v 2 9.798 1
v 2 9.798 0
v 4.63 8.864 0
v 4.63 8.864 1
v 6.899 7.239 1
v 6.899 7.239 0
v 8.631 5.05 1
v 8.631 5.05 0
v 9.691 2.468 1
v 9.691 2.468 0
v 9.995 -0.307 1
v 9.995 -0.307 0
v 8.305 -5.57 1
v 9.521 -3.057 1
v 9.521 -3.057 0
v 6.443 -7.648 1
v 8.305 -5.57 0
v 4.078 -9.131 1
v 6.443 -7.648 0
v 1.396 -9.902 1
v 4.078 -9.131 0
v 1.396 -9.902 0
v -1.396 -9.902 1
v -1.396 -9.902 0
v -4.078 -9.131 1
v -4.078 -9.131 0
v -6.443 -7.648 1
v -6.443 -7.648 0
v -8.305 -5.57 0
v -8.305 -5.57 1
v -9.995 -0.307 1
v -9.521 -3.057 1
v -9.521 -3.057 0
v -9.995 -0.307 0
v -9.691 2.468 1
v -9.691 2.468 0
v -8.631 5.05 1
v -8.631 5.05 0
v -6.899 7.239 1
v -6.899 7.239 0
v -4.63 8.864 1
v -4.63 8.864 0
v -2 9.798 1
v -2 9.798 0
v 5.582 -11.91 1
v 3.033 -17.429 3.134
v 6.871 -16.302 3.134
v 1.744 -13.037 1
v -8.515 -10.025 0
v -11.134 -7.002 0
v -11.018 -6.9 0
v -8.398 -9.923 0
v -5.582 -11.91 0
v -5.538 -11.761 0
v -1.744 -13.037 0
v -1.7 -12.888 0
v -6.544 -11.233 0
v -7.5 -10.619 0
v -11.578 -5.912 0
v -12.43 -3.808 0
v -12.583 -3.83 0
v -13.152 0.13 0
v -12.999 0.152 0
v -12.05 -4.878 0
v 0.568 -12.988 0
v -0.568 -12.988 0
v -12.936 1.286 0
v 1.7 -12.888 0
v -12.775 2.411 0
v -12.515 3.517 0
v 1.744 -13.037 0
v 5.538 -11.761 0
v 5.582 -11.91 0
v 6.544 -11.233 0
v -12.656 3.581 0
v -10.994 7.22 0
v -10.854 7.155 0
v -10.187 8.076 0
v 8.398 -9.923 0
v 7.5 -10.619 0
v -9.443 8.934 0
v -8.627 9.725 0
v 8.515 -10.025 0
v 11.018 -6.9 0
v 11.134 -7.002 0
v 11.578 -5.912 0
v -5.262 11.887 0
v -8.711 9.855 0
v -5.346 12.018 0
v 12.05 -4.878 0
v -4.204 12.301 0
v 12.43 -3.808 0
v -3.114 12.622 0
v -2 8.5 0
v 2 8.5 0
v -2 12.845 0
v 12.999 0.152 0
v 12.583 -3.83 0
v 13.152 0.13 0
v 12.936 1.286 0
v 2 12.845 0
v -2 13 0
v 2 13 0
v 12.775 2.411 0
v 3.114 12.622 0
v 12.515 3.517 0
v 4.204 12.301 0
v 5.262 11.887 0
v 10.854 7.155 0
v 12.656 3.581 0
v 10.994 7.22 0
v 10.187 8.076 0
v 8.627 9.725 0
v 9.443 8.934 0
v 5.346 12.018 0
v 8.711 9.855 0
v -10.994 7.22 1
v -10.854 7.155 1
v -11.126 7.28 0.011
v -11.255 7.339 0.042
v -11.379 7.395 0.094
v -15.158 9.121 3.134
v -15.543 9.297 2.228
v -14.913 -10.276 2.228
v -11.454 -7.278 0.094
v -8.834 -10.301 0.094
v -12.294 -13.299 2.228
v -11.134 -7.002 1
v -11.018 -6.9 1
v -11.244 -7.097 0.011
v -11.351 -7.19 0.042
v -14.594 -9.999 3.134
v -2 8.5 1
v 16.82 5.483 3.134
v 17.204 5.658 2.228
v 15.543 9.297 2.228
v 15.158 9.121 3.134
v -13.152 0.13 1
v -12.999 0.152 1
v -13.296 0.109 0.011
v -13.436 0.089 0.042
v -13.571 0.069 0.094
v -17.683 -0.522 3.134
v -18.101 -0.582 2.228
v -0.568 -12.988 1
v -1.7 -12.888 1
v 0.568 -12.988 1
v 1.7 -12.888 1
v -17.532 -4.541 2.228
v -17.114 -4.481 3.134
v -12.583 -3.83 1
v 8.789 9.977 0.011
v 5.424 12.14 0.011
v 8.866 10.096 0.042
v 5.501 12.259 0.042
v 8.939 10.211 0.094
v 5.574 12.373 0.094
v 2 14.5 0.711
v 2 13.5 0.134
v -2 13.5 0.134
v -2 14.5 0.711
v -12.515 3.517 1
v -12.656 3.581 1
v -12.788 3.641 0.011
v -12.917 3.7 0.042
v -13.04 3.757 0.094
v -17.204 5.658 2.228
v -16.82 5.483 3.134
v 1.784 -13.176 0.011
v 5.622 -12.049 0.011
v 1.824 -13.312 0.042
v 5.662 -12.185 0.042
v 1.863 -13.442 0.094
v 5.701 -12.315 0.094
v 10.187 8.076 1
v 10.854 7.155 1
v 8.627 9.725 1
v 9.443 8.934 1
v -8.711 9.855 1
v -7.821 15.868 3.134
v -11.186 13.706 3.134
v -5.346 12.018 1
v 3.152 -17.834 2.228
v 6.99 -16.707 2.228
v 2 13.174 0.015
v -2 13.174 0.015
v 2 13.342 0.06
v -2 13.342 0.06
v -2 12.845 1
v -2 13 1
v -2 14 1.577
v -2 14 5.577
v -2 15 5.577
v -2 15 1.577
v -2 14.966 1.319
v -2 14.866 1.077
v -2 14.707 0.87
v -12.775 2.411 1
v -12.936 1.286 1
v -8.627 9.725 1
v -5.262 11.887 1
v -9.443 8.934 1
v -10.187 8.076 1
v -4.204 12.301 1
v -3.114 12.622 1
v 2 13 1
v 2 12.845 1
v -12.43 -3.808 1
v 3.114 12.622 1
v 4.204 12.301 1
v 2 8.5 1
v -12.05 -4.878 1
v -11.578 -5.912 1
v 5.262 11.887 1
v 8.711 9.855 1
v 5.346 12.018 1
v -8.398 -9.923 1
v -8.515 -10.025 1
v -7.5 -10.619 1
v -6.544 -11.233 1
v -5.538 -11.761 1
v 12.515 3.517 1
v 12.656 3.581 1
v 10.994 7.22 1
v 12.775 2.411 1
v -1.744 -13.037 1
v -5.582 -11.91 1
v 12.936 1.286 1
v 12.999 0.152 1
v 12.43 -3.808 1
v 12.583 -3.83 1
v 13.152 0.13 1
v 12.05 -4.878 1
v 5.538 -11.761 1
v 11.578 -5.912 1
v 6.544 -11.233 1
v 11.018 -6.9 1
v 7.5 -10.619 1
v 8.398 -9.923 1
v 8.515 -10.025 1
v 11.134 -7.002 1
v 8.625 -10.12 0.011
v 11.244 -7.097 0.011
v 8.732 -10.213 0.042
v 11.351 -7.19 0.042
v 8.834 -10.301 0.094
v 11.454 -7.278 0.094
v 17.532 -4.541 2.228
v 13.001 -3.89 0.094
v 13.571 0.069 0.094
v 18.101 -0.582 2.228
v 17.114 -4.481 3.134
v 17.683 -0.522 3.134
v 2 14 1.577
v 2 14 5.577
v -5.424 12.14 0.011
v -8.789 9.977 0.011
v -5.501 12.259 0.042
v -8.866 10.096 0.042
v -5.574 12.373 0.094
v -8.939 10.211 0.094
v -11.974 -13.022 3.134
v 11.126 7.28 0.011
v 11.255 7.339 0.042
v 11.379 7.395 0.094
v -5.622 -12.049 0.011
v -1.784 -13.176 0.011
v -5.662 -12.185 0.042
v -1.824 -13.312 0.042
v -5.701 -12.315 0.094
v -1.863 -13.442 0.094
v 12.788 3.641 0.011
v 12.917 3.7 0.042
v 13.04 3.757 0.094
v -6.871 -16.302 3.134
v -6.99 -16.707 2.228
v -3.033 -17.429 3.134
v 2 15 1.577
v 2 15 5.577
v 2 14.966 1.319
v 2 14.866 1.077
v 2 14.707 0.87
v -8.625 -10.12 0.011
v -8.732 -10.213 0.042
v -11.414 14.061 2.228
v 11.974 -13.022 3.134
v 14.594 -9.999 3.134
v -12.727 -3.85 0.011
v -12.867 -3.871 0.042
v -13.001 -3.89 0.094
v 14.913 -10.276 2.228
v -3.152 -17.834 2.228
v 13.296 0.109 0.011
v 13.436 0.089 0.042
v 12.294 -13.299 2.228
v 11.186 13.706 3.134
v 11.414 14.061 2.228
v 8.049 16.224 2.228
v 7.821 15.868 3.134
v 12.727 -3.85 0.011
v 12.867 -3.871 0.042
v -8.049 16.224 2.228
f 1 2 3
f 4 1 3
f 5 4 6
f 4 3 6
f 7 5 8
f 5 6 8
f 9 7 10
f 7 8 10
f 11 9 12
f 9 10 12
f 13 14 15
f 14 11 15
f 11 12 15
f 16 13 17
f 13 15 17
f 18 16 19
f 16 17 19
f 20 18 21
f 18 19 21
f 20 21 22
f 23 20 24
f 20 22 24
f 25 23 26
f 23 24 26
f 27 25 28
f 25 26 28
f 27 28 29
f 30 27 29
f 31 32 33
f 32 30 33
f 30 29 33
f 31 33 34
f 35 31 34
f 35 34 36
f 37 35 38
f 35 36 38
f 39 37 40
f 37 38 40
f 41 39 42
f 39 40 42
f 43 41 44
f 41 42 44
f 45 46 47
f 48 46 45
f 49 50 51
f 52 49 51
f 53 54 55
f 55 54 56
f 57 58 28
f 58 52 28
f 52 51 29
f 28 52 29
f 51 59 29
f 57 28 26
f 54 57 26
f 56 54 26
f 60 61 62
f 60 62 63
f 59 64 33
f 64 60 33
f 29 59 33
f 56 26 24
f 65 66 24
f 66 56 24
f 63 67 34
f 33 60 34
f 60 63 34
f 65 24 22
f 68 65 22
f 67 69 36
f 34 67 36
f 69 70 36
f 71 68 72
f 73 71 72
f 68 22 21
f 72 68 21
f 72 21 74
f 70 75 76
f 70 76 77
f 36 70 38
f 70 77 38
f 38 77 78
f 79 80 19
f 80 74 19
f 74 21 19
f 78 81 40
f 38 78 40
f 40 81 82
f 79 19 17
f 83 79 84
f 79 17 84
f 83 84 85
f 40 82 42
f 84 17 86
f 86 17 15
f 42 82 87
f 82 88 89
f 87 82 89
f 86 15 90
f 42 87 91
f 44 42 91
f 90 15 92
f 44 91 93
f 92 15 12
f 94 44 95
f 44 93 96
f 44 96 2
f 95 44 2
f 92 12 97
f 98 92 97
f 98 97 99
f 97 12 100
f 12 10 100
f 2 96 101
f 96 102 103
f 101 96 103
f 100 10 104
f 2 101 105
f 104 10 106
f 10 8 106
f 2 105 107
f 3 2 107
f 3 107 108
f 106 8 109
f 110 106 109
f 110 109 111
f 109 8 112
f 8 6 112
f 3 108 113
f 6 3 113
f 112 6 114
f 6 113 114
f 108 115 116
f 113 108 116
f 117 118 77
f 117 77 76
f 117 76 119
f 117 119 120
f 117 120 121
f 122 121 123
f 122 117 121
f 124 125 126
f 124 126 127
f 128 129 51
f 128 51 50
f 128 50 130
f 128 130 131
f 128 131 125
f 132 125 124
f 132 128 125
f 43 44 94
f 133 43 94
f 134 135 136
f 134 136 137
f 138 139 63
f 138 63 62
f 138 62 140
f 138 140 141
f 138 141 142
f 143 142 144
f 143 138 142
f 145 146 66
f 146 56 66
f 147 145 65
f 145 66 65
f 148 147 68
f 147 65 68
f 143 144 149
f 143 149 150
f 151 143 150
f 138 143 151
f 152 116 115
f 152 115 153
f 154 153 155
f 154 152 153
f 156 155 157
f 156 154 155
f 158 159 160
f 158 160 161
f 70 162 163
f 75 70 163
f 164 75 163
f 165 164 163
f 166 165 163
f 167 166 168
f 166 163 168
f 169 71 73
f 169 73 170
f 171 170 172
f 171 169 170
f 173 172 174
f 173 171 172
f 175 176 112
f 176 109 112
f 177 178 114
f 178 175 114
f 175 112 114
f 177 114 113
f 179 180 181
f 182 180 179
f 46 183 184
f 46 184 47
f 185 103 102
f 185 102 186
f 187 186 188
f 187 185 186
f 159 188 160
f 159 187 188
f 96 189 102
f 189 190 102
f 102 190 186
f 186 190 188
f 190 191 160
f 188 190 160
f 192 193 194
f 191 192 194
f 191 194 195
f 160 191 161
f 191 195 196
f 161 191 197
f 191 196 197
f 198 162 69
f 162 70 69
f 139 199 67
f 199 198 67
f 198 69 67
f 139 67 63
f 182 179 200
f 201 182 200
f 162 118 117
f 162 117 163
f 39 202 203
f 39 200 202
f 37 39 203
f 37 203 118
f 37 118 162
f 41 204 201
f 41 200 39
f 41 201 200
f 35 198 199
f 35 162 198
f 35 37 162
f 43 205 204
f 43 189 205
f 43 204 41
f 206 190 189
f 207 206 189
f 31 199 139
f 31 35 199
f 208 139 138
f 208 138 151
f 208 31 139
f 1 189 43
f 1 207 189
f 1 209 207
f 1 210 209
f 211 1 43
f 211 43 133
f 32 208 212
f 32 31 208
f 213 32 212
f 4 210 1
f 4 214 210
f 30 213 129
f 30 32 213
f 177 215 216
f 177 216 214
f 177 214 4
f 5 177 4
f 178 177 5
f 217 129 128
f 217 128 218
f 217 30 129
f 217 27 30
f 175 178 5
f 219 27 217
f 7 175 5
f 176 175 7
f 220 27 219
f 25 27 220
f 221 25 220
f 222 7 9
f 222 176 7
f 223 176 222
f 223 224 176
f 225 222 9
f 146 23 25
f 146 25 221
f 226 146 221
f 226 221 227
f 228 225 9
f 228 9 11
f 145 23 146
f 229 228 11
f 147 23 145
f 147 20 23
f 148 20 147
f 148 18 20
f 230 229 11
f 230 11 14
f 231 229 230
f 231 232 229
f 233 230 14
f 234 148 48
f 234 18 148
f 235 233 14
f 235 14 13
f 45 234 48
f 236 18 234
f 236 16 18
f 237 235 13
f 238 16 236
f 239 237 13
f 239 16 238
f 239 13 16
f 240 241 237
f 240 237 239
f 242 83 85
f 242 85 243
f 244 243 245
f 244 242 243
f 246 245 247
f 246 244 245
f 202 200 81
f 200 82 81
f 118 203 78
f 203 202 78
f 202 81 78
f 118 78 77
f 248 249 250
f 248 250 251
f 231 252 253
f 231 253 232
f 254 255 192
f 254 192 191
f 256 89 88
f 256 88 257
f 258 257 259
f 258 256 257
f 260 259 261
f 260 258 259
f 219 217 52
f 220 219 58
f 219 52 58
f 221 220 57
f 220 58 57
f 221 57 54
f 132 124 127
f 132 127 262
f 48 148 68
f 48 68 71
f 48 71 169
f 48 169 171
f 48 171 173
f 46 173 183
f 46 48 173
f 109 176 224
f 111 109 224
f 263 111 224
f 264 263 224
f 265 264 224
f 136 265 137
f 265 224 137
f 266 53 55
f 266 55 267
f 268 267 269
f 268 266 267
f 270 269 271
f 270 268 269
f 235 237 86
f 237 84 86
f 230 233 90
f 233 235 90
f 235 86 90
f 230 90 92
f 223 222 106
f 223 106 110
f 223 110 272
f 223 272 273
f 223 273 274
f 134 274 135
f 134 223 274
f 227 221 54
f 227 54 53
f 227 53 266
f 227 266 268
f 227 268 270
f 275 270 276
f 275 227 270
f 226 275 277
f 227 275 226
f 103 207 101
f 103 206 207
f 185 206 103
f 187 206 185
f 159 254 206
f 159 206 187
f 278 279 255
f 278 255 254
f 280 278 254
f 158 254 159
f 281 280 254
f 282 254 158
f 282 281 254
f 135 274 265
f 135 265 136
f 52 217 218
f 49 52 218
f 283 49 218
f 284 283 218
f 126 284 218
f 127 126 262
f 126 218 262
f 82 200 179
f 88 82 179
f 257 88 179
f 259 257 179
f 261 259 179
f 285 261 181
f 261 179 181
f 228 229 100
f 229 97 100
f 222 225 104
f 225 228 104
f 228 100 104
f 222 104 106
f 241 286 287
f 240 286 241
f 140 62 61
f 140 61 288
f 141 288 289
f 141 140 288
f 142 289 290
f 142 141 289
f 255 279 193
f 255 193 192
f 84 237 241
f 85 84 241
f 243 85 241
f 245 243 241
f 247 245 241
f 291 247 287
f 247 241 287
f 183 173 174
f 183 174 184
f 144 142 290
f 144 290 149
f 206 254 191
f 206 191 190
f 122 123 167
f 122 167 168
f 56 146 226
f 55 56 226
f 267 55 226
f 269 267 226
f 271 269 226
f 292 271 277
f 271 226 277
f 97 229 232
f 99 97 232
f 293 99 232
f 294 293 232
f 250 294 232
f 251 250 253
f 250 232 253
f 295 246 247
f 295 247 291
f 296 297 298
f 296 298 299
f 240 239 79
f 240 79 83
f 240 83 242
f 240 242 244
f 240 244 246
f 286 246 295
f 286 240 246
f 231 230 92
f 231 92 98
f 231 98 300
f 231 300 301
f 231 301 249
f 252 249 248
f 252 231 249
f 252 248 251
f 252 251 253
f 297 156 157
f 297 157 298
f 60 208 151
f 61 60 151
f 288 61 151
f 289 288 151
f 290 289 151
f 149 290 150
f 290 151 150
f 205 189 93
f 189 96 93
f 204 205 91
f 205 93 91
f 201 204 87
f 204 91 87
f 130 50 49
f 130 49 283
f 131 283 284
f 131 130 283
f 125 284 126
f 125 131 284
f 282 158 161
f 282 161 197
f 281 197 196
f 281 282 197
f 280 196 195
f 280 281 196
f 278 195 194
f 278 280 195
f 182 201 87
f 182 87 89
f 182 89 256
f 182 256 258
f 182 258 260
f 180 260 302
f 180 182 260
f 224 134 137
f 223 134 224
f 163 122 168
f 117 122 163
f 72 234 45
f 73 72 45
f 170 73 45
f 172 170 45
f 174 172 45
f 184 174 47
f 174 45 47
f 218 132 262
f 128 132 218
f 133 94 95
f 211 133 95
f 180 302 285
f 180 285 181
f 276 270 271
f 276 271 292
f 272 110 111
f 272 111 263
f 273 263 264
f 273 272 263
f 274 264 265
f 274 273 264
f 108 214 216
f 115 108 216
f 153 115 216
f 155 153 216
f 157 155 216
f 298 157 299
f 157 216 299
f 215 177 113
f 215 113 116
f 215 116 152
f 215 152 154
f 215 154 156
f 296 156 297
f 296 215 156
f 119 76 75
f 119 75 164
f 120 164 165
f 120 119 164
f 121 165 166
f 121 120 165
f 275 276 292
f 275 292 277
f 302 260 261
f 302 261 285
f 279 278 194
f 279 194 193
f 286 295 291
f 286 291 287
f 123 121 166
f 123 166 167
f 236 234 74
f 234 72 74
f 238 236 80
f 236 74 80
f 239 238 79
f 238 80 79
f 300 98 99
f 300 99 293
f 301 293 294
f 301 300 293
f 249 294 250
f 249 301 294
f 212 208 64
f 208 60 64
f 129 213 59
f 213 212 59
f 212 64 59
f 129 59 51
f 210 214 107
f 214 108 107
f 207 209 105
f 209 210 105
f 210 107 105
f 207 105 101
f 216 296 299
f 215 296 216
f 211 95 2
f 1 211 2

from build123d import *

# Parameters (mm, degrees)
ESQUISSE1_R                  = 13
BASE_EXTRUSION_DEPTH         = 1
BOSS_EXTRU_MINCE1_DEPTH      = 2
R_P_TITION_CIRCULAIRE1_COUNT = 10
R_P_TITION_CIRCULAIRE1_ANGLE = 294.545454545
BOSS_EXTRU_MINCE2_DEPTH      = 2


with BuildPart() as part:
    # Esquisse1 → Base-Extrusion (new body)
    with BuildSketch(Plane.XY):
        Circle(ESQUISSE1_R)
        with BuildLine():
            Line((-2, 8.5), (2, 8.5))
            Line((2, 8.5), (2, 9.797958971))
            ThreePointArc((2, 9.797958971), (0, -10), (-2, 9.797958971))
            Line((-2, 9.797958971), (-2, 8.5))
        make_face(mode=Mode.SUBTRACT)
    extrude(amount=BASE_EXTRUSION_DEPTH)

    # Esquisse2 → Boss.-Extru.-Mince1 (add, symmetric)
    with BuildSketch(Plane(origin=(0, 0, 0), x_dir=(-0.5406408174555986, 0.8412535328311805, 0), z_dir=(0.8412535328311805, 0.5406408174555986, 0))):
        with BuildLine():
            Line((10, 0), (13, 0))
            ThreePointArc((13, 0), (13.216439614, 0.023703993), (13.422618262, 0.093692213))
            Line((13.422618262, 0.093692213), (18, 2.228160372))
            Line((18, 2.228160372), (17.577381738, 3.134468159))
            Line((17.577381738, 3.134468159), (13, 1))
            Line((13, 1), (10, 1))
            Line((10, 1), (10, 0))
        make_face()
    boss_extru_mince1 = extrude(amount=BOSS_EXTRU_MINCE1_DEPTH, both=True)

    # Répétition circulaire1: Boss.-Extru.-Mince1 ×10 about axis
    r_p_tition_circulaire1_axis = Axis((0, 0, -7.805907173), (0, 0, 1))
    for i in range(1, R_P_TITION_CIRCULAIRE1_COUNT):
        add(boss_extru_mince1.rotate(r_p_tition_circulaire1_axis, i * R_P_TITION_CIRCULAIRE1_ANGLE / (R_P_TITION_CIRCULAIRE1_COUNT - 1)))

    # Esquisse3 → Boss.-Extru.-Mince2 (add, symmetric)
    with BuildSketch(Plane(origin=(0, 0, 0), x_dir=(0, 0, -1), z_dir=(1, 0, 0))):
        with BuildLine():
            Line((0, 10), (0, 13))
            ThreePointArc((0, 13), (-0.034074174, 13.258819045), (-0.133974596, 13.5))
            Line((-0.133974596, 13.5), (-0.711324865, 14.5))
            ThreePointArc((-0.711324865, 14.5), (-1.077350269, 14.866025404), (-1.577350269, 15))
            Line((-1.577350269, 15), (-5.577350269, 15))
            Line((-5.577350269, 15), (-5.577350269, 14))
            Line((-5.577350269, 14), (-1.577350269, 14))
            Line((-1.577350269, 14), (-1, 13))
            Line((-1, 13), (-1, 10))
            Line((-1, 10), (0, 10))
        make_face()
    extrude(amount=BOSS_EXTRU_MINCE2_DEPTH, both=True)


solid = part.part
